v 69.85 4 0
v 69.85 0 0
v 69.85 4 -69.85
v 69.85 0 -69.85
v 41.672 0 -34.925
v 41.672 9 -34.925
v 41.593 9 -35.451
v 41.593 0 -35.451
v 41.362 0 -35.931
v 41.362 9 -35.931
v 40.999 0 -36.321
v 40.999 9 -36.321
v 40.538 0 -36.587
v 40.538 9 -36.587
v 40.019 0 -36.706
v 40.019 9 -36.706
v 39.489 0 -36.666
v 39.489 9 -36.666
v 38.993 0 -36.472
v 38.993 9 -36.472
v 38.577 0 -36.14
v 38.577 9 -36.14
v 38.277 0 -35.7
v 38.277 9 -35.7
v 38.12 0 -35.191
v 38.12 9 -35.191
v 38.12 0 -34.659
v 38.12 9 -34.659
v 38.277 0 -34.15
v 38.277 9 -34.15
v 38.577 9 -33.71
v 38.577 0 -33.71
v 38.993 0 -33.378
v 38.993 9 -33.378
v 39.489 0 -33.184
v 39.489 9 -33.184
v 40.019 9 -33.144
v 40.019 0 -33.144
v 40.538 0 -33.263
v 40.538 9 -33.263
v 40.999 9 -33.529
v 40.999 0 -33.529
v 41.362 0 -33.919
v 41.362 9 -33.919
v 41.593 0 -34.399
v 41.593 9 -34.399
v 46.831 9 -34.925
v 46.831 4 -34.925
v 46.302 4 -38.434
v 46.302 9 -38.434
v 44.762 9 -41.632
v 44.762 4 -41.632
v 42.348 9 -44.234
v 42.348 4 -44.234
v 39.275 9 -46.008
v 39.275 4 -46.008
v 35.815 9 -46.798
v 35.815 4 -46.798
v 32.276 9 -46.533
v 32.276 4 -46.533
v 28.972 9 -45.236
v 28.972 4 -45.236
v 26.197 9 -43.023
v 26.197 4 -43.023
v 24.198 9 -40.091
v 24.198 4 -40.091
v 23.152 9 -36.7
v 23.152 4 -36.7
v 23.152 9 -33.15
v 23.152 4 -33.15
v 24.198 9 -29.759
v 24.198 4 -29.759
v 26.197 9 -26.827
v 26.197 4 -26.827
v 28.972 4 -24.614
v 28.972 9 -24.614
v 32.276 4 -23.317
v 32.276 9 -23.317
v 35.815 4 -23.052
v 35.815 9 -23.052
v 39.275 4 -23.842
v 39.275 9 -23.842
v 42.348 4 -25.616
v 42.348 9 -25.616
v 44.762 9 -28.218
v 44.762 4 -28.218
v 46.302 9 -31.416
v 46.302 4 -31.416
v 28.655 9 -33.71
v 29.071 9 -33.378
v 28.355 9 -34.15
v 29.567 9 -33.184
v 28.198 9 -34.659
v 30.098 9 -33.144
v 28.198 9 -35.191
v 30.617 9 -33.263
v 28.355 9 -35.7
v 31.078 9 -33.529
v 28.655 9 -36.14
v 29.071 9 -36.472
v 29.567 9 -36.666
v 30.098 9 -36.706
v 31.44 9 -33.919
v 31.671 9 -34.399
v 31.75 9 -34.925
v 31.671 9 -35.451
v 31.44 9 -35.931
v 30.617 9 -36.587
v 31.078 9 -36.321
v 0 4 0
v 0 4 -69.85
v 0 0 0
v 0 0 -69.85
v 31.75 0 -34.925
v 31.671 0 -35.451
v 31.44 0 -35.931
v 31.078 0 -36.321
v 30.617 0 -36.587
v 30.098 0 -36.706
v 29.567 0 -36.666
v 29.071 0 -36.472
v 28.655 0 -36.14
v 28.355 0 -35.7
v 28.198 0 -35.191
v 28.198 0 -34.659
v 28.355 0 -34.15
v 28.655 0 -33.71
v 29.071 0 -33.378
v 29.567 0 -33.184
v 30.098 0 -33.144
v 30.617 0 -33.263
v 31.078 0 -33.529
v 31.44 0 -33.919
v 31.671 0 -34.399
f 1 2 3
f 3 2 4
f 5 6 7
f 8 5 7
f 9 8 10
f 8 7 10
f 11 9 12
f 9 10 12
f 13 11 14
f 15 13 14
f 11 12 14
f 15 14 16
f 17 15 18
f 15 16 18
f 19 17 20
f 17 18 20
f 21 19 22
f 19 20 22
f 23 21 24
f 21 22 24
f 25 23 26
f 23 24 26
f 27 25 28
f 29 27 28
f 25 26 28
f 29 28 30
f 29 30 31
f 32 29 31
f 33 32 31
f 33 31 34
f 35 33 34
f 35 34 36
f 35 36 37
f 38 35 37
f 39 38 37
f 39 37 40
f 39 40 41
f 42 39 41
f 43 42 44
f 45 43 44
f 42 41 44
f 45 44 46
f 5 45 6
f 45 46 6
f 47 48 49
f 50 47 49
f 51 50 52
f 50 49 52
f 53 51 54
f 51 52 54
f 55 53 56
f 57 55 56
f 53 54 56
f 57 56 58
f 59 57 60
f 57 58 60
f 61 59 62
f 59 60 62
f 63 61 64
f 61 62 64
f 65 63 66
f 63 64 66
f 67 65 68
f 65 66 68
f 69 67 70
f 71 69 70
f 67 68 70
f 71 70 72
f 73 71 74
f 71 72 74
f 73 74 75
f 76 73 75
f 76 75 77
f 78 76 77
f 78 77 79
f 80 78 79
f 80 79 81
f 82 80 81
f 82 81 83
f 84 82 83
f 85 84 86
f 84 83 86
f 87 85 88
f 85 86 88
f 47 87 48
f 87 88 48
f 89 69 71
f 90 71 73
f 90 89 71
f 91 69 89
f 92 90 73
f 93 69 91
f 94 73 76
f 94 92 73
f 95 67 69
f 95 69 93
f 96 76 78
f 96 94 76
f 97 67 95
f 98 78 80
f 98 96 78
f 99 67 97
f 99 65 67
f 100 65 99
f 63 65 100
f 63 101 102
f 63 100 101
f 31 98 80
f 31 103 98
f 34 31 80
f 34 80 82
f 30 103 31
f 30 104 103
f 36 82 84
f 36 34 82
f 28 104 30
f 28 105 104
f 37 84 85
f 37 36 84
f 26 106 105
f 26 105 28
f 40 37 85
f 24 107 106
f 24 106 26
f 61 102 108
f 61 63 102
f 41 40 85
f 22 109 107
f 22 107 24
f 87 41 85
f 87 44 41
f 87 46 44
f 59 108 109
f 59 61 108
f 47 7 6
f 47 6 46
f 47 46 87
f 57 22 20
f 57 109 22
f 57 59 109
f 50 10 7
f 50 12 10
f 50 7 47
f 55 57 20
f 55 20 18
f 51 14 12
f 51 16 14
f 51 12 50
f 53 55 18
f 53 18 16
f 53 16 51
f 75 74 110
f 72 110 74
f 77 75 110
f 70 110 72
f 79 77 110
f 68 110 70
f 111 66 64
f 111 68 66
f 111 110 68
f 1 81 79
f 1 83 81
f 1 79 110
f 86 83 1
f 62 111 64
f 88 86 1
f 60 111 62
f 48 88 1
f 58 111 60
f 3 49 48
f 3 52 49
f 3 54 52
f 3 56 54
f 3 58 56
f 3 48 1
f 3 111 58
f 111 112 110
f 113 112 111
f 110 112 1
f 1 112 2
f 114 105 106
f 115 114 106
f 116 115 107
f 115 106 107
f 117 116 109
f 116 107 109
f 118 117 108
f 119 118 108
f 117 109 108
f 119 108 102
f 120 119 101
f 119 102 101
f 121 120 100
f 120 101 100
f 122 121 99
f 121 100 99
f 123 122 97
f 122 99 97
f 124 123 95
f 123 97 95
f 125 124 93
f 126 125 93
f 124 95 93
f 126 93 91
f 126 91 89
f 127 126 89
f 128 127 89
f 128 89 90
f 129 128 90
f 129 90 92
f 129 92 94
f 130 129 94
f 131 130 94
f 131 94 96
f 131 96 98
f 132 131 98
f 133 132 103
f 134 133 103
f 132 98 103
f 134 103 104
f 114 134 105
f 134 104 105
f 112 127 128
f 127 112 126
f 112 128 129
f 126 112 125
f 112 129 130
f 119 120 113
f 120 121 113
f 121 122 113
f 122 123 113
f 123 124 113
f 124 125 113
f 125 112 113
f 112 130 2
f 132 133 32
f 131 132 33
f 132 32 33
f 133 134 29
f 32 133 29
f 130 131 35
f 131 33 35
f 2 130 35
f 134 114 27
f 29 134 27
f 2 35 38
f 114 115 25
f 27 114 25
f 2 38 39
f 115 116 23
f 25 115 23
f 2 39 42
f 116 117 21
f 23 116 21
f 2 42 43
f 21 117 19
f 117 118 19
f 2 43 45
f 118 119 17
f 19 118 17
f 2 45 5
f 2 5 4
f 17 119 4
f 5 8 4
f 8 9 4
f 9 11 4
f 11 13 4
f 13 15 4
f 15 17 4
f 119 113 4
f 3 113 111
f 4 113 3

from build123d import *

# Parameters (mm, degrees)
SKETCH1_W           = 69.85
SKETCH1_H           = 69.85
BOSS_EXTRUDE1_DEPTH = 4
SKETCH2_R           = 11.90625
BOSS_EXTRUDE2_DEPTH = 5
SKETCH3_R           = 1.7859375
CUT_EXTRUDE1_DEPTH  = 9


with BuildPart() as part:
    # Sketch1 → Boss-Extrude1 (new body)
    with BuildSketch(Plane(origin=(0, 0, 0), x_dir=(1, 0, 0), z_dir=(0, 1, 0))):
        with Locations((34.925, 34.925)):
            Rectangle(SKETCH1_W, SKETCH1_H)
    extrude(amount=BOSS_EXTRUDE1_DEPTH)

    # Sketch2 → Boss-Extrude2 (add)
    with BuildSketch(Plane(origin=(0, 4, 0), x_dir=(1, 0, 0), z_dir=(0, 1, 0))):
        with Locations((34.925, 34.925)):
            Circle(SKETCH2_R)
    extrude(amount=BOSS_EXTRUDE2_DEPTH)

    # Sketch3 → Cut-Extrude1 (cut)
    with BuildSketch(Plane(origin=(0, 9, 0), x_dir=(1, 0, 0), z_dir=(0, 1, 0))):
        with Locations((29.9640625, 34.925)):
            Circle(SKETCH3_R)
        with Locations((39.8859375, 34.925)):
            Circle(SKETCH3_R)
    extrude(amount=-CUT_EXTRUDE1_DEPTH, mode=Mode.SUBTRACT)


solid = part.part
